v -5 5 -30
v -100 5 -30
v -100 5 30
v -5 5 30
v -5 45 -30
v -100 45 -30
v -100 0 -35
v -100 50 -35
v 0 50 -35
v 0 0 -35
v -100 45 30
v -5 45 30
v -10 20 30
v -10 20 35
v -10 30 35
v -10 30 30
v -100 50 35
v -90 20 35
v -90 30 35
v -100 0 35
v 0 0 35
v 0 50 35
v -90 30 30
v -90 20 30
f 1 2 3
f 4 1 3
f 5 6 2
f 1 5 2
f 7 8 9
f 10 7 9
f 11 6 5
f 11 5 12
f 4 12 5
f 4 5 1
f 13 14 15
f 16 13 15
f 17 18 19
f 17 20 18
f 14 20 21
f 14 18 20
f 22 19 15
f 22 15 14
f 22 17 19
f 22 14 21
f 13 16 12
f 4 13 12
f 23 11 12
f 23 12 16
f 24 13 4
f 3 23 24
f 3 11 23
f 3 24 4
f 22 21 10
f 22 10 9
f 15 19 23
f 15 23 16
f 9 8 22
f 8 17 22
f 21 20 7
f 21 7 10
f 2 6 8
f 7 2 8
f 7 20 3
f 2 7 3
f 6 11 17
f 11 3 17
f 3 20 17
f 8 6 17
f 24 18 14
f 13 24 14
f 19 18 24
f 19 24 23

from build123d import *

# Parameters (mm, degrees)
F0_W     = 100
F0_H     = 50
F1_DEPTH = 35
F2_W     = 40
F2_H     = 60
F3_DEPTH = 95
F4_W     = 80
F4_H     = 10
F5_DEPTH = 5


with BuildPart() as f1:
    # F0 (on Top) → F1 (new body, symmetric)
    with BuildSketch(Plane.XY):
        with Locations((-50, 25)):
            Rectangle(F0_W, F0_H)
    extrude(amount=F1_DEPTH, both=True)

    # F2 (on face) → F3 (cut)
    with BuildSketch(Plane(origin=(-100, 0, 0), x_dir=(0, -1, 0), z_dir=(-1, 0, 0))):
        with Locations((-25, 0)):
            Rectangle(F2_W, F2_H)
    extrude(amount=-F3_DEPTH, mode=Mode.SUBTRACT)

    # F4 (on face) → F5 (cut, through all)
    with BuildSketch(Plane.XY.offset(35)):
        with Locations((-50, 25)):
            Rectangle(F4_W, F4_H)
    extrude(amount=-F5_DEPTH, mode=Mode.SUBTRACT)


solid = f1.part
